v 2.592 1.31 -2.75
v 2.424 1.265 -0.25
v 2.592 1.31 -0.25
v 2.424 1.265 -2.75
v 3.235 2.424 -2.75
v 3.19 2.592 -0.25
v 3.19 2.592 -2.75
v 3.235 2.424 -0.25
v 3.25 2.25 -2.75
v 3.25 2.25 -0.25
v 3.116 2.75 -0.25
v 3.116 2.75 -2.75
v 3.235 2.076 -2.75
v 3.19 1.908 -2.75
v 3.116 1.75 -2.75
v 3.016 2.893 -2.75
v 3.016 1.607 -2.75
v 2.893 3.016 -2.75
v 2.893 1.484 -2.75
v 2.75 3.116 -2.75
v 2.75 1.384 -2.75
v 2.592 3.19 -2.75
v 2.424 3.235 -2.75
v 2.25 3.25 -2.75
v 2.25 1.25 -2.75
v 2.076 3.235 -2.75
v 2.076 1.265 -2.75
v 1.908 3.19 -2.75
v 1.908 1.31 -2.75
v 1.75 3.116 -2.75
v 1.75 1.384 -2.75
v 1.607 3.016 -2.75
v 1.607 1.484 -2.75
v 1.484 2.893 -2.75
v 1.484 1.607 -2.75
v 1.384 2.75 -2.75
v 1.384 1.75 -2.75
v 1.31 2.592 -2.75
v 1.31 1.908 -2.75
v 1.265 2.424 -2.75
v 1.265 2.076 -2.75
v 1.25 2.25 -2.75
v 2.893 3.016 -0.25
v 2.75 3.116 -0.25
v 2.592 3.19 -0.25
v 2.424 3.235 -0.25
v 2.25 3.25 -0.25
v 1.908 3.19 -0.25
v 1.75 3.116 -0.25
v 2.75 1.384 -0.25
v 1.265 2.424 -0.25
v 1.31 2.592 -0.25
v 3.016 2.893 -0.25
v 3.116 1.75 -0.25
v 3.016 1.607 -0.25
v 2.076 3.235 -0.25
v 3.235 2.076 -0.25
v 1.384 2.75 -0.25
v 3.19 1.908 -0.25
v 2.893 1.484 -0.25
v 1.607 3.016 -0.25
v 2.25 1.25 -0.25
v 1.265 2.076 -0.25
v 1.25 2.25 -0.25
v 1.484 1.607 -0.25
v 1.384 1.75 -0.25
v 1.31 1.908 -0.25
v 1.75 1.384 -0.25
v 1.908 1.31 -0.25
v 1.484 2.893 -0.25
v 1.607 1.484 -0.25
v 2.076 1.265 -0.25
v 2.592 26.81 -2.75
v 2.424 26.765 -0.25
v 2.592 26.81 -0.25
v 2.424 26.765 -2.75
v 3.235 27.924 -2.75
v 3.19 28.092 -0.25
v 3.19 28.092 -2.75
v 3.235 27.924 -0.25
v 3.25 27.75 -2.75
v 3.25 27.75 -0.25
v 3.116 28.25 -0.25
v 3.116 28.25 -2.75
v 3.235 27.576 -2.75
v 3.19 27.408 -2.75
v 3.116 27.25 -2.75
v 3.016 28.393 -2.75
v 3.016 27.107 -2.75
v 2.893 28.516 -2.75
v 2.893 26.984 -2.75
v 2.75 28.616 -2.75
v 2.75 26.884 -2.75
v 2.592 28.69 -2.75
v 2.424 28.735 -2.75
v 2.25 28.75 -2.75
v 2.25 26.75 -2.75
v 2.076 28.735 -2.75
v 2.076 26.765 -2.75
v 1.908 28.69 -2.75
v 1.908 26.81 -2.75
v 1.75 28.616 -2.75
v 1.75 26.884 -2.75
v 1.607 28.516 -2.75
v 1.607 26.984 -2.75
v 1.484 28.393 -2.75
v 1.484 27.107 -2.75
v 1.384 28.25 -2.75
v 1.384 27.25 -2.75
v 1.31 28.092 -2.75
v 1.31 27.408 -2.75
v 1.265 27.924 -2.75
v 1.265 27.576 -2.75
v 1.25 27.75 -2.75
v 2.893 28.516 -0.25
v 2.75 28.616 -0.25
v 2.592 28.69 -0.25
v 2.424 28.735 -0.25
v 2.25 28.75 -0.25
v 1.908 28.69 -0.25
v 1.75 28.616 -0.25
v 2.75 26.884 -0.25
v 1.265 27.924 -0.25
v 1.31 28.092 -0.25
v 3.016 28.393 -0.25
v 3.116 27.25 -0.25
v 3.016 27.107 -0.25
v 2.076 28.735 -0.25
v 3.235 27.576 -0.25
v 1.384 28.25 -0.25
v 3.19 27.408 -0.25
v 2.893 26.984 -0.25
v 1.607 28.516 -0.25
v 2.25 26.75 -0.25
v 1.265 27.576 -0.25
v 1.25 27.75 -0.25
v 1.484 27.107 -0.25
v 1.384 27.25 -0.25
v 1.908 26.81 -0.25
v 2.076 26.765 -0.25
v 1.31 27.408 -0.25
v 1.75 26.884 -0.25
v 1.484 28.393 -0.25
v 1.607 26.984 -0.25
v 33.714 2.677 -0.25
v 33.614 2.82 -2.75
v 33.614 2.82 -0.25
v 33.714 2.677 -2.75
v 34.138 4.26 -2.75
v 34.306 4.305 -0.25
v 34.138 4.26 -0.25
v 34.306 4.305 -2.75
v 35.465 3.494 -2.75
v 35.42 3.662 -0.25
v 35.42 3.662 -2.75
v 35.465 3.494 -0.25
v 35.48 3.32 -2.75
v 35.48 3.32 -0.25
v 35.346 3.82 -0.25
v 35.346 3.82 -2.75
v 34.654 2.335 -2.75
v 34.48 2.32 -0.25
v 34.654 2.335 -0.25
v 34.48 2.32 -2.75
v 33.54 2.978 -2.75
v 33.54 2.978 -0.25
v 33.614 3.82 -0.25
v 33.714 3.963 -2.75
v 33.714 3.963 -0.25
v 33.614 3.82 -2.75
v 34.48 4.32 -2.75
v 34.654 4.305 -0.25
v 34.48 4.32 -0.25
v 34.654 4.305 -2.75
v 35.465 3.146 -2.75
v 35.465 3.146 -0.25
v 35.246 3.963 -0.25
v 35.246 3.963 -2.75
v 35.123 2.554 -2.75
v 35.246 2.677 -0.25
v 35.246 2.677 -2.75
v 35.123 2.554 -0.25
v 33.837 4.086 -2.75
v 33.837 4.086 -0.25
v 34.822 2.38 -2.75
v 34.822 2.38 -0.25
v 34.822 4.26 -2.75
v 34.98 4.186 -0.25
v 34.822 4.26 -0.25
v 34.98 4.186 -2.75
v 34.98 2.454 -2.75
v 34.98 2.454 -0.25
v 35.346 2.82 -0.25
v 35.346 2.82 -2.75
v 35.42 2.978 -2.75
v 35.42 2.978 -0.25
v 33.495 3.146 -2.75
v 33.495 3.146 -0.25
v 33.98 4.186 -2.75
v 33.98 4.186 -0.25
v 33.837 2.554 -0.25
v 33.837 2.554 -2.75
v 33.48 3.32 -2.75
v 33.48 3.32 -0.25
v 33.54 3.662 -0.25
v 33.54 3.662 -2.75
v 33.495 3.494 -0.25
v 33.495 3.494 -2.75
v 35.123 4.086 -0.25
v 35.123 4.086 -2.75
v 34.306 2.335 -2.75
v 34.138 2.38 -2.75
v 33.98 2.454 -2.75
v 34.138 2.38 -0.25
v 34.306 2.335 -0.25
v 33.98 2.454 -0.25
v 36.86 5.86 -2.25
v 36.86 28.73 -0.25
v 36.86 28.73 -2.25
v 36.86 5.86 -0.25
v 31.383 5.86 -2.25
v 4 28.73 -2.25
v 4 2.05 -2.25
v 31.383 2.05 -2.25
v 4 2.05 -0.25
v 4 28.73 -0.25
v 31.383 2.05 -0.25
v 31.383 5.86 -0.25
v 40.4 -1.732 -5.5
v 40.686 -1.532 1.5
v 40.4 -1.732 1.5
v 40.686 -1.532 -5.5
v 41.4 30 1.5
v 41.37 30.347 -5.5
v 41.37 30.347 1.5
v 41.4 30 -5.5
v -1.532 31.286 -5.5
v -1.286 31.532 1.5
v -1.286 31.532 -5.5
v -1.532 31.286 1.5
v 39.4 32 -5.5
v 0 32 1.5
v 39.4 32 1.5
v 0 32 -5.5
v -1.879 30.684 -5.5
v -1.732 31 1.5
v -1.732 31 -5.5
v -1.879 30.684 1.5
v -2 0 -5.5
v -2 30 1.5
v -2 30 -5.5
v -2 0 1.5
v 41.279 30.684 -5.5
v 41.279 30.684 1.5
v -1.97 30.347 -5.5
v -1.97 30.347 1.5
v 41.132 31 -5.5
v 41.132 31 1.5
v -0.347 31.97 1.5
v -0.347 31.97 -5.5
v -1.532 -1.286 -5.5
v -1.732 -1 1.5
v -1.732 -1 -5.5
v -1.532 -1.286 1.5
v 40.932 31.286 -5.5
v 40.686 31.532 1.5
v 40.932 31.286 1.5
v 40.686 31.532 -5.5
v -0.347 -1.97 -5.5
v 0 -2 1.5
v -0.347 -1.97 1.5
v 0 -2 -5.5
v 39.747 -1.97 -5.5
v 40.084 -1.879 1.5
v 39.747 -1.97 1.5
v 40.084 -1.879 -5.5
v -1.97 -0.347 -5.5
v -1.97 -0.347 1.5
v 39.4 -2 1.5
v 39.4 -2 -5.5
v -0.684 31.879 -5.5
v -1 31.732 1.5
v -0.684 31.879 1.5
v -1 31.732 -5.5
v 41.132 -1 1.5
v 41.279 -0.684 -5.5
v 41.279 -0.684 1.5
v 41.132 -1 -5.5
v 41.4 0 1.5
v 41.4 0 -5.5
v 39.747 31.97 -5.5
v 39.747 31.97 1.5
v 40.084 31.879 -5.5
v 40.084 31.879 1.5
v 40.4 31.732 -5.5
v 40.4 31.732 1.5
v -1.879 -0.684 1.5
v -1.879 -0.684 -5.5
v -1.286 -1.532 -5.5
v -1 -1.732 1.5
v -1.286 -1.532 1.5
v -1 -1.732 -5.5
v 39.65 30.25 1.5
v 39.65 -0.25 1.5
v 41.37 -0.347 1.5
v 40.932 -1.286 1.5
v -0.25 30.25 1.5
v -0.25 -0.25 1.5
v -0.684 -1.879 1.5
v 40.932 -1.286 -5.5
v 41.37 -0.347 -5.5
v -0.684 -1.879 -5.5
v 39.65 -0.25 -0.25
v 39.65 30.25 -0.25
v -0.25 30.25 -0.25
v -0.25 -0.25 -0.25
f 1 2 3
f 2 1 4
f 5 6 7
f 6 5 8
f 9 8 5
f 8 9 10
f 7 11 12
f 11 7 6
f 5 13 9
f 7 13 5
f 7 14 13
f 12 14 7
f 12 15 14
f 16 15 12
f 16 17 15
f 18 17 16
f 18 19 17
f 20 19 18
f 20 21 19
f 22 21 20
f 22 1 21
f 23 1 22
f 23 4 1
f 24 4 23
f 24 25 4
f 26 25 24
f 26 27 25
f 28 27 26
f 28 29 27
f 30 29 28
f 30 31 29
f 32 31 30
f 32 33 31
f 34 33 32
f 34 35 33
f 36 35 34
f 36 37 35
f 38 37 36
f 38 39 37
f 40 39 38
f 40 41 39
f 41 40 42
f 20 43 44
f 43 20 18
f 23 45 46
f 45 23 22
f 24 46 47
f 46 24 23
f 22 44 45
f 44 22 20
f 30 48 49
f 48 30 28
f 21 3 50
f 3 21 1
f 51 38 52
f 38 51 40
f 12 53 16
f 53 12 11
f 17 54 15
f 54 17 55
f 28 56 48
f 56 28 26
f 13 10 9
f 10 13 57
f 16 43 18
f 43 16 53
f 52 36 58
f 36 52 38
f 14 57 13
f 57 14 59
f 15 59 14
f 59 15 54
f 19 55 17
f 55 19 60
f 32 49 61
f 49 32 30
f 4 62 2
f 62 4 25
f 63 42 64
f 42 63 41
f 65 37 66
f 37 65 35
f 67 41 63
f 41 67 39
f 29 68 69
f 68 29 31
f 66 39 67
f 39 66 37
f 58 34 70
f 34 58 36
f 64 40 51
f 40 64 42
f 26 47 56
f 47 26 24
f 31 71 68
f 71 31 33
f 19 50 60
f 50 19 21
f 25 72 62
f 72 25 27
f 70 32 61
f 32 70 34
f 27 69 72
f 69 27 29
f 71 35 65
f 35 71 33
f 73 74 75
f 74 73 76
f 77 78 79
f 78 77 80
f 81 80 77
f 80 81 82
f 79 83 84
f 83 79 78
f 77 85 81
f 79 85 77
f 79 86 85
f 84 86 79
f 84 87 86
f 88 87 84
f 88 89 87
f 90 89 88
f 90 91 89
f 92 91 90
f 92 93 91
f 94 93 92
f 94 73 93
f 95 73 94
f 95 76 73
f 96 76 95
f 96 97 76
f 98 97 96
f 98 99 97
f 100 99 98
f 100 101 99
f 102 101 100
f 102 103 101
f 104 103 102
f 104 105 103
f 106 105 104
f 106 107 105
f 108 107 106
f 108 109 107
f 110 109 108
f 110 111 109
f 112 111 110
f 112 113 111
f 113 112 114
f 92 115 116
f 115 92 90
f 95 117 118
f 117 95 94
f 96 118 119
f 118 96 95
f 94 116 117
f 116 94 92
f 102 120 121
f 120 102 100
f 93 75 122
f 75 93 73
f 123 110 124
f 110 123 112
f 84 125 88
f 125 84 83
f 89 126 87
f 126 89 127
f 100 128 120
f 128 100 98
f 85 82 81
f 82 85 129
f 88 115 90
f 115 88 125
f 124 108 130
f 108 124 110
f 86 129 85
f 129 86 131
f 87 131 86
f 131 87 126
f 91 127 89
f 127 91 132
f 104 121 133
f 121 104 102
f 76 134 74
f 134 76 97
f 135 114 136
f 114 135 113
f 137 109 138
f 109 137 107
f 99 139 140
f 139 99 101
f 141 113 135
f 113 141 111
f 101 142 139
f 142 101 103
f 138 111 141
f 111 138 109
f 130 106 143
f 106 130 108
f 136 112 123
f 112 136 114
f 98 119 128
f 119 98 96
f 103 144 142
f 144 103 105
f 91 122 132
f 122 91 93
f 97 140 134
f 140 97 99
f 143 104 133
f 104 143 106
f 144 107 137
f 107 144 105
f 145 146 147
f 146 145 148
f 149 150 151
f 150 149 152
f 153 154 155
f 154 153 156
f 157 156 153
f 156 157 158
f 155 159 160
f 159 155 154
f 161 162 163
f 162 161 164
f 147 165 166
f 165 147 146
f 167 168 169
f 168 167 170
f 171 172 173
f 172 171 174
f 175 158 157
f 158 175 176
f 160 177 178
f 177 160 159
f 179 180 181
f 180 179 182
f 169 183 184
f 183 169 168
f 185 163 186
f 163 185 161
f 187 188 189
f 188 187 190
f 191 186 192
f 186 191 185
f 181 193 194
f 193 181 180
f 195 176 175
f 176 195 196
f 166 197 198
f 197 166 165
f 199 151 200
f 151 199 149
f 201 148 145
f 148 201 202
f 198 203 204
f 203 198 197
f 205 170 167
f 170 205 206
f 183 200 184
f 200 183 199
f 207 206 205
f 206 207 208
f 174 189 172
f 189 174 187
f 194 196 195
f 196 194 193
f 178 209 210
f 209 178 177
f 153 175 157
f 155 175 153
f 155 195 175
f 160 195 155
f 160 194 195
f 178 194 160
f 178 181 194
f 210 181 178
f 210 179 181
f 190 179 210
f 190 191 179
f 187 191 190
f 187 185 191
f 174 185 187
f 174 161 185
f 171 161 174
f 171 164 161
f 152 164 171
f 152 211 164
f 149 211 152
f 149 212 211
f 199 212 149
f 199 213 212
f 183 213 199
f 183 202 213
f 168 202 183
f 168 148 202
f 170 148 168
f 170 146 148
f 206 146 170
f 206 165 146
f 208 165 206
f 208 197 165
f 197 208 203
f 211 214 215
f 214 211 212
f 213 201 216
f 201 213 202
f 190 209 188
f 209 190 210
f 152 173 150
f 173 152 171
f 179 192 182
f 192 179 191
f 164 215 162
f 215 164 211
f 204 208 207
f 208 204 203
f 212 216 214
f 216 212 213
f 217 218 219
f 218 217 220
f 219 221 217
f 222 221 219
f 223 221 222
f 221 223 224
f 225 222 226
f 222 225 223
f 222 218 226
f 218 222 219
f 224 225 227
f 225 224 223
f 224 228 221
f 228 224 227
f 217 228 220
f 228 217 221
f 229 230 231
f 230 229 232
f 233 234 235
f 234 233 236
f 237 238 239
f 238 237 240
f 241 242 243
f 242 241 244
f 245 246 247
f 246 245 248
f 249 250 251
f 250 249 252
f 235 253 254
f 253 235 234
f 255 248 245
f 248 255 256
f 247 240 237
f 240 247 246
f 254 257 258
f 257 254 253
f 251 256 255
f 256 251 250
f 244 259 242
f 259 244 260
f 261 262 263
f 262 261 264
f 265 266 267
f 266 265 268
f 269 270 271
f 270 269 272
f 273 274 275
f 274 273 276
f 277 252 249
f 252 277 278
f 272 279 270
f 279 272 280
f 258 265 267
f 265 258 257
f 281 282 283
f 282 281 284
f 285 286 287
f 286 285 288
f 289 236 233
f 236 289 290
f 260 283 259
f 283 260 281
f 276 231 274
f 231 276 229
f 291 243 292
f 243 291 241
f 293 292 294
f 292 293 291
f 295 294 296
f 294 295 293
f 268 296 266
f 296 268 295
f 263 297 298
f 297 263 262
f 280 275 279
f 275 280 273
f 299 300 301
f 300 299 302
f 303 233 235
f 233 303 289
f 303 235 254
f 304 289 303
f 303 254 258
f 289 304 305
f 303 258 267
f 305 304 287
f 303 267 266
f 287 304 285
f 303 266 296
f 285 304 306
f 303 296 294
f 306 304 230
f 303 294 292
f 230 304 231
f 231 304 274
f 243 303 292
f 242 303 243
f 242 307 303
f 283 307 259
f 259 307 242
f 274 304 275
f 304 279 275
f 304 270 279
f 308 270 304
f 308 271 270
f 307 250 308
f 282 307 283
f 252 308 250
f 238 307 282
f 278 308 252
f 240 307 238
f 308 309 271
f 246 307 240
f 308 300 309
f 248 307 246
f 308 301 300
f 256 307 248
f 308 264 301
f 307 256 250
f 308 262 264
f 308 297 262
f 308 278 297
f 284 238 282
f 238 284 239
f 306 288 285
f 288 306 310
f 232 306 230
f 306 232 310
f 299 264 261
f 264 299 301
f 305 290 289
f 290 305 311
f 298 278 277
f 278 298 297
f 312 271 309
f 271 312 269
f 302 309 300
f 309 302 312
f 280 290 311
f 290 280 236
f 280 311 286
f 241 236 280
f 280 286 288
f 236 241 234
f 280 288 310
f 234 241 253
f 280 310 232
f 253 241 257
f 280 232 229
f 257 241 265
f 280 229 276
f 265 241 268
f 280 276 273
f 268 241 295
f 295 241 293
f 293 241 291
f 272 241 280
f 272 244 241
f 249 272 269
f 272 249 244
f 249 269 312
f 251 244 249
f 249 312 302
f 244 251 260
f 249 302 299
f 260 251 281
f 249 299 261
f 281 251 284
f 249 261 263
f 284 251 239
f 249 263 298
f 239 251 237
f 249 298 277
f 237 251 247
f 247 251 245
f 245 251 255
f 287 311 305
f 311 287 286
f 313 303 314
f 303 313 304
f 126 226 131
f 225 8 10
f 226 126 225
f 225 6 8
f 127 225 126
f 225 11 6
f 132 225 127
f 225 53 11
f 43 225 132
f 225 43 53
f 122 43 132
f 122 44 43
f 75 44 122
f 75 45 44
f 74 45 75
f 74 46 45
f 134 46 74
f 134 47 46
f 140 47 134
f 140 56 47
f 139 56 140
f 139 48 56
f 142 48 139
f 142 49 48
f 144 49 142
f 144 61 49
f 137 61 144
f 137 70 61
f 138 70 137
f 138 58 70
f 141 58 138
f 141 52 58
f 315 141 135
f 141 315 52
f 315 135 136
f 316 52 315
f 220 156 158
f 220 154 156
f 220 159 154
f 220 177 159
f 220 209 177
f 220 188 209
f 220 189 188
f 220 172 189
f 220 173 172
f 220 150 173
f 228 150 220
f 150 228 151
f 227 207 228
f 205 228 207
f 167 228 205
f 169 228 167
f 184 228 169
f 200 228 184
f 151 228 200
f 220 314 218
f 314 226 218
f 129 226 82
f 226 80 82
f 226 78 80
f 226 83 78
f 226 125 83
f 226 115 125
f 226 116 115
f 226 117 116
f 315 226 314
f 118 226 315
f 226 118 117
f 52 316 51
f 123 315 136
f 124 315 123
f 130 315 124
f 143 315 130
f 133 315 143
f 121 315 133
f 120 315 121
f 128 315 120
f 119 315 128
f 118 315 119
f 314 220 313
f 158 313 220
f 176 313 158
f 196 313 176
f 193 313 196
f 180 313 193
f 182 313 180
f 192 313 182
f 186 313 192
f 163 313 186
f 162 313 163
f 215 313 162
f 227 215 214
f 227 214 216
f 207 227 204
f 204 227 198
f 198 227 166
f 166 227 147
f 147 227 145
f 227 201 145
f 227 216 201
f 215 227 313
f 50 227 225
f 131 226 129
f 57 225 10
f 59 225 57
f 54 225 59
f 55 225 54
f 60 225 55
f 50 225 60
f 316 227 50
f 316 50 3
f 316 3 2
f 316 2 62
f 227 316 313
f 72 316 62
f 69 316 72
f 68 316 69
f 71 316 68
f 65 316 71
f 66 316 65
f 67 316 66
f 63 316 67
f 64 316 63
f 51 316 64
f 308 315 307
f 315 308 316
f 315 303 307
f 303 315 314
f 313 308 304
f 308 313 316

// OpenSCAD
// file: sensor.scad
// SunTracker Sensor
// Platine [mm]
plate = [ 39.4, 30.0, 1.5];

function pcb_col_border() =
    plate[1] - 9 * 2.54 - 1.0/2.0;
    
function pcb_hole_pt(col, row) =
    [3+2.54+1, pcb_col_border()/2, 1.5/2] + 
    [(col-1)*2.54, (row-1)*2.54, 0];

module pcb_hole(col, row)
{
    translate(pcb_hole_pt(col, row))
        cylinder(d=1, h= 2*1.5, center=true, $fn=24);
}
module pcb_holes()
{
    for (col = [1:14])
        for (row = [1:10])
            pcb_hole(col, row);
}

function mount_screw_dm() = 2;
module mount_hole(pt, dm)
{
    translate(pt) 
        cylinder(d=dm, h=2*1.5, center=true, $fn=36);
}

function mount_hole_centers() = [
    // 2.5 mm 
    [1+2.5/2, 1+2.5/2, 1.5/2],
    // 2.5 mm 
    [1+2.5/2, plate[1]-(1+2.5/2), 1.5/2],
    // 2.0 mm 
    pcb_hole_pt(12,1)];

function mount_hole_dms() = [2.5, 2.5, 2];

module mount_holes()
{
    pts = mount_hole_centers();
    dms = mount_hole_dms();
    for (i = [0:2])
        mount_hole(pts[i], dms[i]);
}
module pcb() 
{
    difference() {
    color ("green") cube(plate);
    pcb_holes();
    mount_holes();
    }
    
}

*pcb();

module ldr(pt)
{
    color("red") 
    translate(pt) translate([0,0,1.5]) {
        hull() {
        translate([-2.54/2, 0, 0])
        cylinder(d=2.54, h=1, center=true,$fn=36);
        translate([2.54/2, 0, 0])
        cylinder(d=2.54, h=1, center=true, $fn=36);
        }
    }
}

module ldr_top() { ldr(pcb_hole_pt(5,9)); }
module ldr_left() { ldr(pcb_hole_pt(2,4)); }
module ldr_right() { ldr(pcb_hole_pt(8,4)); }

module ldrs()
{
    ldr_top();
    ldr_left();
    ldr_right();
}

*ldrs();

function sensor_connector_box() =
    [2.54, 5*2.54, 8];

function sensor_connector_pos() =
    pcb_hole_pt(12,7);

// the 5 pin connector
module connector(pt)
{
    box = sensor_connector_box();
    color("black")
    translate(pt) translate([0,0,box[2]/2])
    cube(box, true);
}

*connector(sensor_connector_pos);

module sensor()
{
    pcb();
    ldrs();
    connector(pcb_hole_pt(12,7));
}

sensor();

function sensor_box() = plate;
function sensor_mounts() = mount_hole_centers();
function sensor_mount_dms() = mount_hole_dms();
// main file
// SunTracker

use <sensor.scad>

*translate([0,0,.1]) sensor();

// overaall size of the bottom case
function case_bottom_box() = sensor_box()+[4,4,5.5];

// one cylinder for the rounded box used for design
module case_bottom_rounded(pt, h)
{
    translate(pt) 
    cylinder(r=2, h=h, $fn=36);
}

// blank used for the design
module case_bottom_blank()
{
    offset = [-2,-2,-5.5];
    pt = case_bottom_box();
    //translate(offset) cube(pt);
    translate(offset) hull() {
        case_bottom_rounded([2,2,0], h=pt[2]);
        case_bottom_rounded([2,pt[1]-2,0], h=pt[2]);
        case_bottom_rounded([pt[0]-2,pt[1]-2,0], h=pt[2]);
        case_bottom_rounded([pt[0]-2,2,0], h=pt[2]);
    }
}

// cutout of the sensor circuit board
module case_bottom_cutout()
{
    border = [0.5, 0.5, 0.5];
    translate(-border/2) 
    cube(sensor_box()+ border);
}

// mount holes for the circuit board for 4mm screws
module case_bottom_holes($fn=36)
{
    color("white")
    for (pt = sensor_mounts())
        translate(pt-[0,0,1.5])
    cylinder(d=mount_screw_dm(),h=4,center=true);
}

// pocket for the wires on back if the cicuit board
module case_bottom_pocket()
{
    pt0 = pcb_hole_pt(1,1);
    dxy = sensor_box() - pt0; 
    pti = [dxy[0], dxy[1], 4];
    ptm = [dxy[0]/6, 1.5*2.54, 4];
    translate([0,0,-3]) 
    translate(pt0-[2.54, 1.27, 0]) 
    color("white") 
    difference()
    {
        cube(pti);
        translate([dxy[0]/6*5,0,0]) cube(ptm);
    }
}

// all in one
module case_bottom() 
{
    difference() {
        case_bottom_blank();
        case_bottom_cutout();
        case_bottom_holes();
        case_bottom_pocket();
    }
    
}

case_bottom();
